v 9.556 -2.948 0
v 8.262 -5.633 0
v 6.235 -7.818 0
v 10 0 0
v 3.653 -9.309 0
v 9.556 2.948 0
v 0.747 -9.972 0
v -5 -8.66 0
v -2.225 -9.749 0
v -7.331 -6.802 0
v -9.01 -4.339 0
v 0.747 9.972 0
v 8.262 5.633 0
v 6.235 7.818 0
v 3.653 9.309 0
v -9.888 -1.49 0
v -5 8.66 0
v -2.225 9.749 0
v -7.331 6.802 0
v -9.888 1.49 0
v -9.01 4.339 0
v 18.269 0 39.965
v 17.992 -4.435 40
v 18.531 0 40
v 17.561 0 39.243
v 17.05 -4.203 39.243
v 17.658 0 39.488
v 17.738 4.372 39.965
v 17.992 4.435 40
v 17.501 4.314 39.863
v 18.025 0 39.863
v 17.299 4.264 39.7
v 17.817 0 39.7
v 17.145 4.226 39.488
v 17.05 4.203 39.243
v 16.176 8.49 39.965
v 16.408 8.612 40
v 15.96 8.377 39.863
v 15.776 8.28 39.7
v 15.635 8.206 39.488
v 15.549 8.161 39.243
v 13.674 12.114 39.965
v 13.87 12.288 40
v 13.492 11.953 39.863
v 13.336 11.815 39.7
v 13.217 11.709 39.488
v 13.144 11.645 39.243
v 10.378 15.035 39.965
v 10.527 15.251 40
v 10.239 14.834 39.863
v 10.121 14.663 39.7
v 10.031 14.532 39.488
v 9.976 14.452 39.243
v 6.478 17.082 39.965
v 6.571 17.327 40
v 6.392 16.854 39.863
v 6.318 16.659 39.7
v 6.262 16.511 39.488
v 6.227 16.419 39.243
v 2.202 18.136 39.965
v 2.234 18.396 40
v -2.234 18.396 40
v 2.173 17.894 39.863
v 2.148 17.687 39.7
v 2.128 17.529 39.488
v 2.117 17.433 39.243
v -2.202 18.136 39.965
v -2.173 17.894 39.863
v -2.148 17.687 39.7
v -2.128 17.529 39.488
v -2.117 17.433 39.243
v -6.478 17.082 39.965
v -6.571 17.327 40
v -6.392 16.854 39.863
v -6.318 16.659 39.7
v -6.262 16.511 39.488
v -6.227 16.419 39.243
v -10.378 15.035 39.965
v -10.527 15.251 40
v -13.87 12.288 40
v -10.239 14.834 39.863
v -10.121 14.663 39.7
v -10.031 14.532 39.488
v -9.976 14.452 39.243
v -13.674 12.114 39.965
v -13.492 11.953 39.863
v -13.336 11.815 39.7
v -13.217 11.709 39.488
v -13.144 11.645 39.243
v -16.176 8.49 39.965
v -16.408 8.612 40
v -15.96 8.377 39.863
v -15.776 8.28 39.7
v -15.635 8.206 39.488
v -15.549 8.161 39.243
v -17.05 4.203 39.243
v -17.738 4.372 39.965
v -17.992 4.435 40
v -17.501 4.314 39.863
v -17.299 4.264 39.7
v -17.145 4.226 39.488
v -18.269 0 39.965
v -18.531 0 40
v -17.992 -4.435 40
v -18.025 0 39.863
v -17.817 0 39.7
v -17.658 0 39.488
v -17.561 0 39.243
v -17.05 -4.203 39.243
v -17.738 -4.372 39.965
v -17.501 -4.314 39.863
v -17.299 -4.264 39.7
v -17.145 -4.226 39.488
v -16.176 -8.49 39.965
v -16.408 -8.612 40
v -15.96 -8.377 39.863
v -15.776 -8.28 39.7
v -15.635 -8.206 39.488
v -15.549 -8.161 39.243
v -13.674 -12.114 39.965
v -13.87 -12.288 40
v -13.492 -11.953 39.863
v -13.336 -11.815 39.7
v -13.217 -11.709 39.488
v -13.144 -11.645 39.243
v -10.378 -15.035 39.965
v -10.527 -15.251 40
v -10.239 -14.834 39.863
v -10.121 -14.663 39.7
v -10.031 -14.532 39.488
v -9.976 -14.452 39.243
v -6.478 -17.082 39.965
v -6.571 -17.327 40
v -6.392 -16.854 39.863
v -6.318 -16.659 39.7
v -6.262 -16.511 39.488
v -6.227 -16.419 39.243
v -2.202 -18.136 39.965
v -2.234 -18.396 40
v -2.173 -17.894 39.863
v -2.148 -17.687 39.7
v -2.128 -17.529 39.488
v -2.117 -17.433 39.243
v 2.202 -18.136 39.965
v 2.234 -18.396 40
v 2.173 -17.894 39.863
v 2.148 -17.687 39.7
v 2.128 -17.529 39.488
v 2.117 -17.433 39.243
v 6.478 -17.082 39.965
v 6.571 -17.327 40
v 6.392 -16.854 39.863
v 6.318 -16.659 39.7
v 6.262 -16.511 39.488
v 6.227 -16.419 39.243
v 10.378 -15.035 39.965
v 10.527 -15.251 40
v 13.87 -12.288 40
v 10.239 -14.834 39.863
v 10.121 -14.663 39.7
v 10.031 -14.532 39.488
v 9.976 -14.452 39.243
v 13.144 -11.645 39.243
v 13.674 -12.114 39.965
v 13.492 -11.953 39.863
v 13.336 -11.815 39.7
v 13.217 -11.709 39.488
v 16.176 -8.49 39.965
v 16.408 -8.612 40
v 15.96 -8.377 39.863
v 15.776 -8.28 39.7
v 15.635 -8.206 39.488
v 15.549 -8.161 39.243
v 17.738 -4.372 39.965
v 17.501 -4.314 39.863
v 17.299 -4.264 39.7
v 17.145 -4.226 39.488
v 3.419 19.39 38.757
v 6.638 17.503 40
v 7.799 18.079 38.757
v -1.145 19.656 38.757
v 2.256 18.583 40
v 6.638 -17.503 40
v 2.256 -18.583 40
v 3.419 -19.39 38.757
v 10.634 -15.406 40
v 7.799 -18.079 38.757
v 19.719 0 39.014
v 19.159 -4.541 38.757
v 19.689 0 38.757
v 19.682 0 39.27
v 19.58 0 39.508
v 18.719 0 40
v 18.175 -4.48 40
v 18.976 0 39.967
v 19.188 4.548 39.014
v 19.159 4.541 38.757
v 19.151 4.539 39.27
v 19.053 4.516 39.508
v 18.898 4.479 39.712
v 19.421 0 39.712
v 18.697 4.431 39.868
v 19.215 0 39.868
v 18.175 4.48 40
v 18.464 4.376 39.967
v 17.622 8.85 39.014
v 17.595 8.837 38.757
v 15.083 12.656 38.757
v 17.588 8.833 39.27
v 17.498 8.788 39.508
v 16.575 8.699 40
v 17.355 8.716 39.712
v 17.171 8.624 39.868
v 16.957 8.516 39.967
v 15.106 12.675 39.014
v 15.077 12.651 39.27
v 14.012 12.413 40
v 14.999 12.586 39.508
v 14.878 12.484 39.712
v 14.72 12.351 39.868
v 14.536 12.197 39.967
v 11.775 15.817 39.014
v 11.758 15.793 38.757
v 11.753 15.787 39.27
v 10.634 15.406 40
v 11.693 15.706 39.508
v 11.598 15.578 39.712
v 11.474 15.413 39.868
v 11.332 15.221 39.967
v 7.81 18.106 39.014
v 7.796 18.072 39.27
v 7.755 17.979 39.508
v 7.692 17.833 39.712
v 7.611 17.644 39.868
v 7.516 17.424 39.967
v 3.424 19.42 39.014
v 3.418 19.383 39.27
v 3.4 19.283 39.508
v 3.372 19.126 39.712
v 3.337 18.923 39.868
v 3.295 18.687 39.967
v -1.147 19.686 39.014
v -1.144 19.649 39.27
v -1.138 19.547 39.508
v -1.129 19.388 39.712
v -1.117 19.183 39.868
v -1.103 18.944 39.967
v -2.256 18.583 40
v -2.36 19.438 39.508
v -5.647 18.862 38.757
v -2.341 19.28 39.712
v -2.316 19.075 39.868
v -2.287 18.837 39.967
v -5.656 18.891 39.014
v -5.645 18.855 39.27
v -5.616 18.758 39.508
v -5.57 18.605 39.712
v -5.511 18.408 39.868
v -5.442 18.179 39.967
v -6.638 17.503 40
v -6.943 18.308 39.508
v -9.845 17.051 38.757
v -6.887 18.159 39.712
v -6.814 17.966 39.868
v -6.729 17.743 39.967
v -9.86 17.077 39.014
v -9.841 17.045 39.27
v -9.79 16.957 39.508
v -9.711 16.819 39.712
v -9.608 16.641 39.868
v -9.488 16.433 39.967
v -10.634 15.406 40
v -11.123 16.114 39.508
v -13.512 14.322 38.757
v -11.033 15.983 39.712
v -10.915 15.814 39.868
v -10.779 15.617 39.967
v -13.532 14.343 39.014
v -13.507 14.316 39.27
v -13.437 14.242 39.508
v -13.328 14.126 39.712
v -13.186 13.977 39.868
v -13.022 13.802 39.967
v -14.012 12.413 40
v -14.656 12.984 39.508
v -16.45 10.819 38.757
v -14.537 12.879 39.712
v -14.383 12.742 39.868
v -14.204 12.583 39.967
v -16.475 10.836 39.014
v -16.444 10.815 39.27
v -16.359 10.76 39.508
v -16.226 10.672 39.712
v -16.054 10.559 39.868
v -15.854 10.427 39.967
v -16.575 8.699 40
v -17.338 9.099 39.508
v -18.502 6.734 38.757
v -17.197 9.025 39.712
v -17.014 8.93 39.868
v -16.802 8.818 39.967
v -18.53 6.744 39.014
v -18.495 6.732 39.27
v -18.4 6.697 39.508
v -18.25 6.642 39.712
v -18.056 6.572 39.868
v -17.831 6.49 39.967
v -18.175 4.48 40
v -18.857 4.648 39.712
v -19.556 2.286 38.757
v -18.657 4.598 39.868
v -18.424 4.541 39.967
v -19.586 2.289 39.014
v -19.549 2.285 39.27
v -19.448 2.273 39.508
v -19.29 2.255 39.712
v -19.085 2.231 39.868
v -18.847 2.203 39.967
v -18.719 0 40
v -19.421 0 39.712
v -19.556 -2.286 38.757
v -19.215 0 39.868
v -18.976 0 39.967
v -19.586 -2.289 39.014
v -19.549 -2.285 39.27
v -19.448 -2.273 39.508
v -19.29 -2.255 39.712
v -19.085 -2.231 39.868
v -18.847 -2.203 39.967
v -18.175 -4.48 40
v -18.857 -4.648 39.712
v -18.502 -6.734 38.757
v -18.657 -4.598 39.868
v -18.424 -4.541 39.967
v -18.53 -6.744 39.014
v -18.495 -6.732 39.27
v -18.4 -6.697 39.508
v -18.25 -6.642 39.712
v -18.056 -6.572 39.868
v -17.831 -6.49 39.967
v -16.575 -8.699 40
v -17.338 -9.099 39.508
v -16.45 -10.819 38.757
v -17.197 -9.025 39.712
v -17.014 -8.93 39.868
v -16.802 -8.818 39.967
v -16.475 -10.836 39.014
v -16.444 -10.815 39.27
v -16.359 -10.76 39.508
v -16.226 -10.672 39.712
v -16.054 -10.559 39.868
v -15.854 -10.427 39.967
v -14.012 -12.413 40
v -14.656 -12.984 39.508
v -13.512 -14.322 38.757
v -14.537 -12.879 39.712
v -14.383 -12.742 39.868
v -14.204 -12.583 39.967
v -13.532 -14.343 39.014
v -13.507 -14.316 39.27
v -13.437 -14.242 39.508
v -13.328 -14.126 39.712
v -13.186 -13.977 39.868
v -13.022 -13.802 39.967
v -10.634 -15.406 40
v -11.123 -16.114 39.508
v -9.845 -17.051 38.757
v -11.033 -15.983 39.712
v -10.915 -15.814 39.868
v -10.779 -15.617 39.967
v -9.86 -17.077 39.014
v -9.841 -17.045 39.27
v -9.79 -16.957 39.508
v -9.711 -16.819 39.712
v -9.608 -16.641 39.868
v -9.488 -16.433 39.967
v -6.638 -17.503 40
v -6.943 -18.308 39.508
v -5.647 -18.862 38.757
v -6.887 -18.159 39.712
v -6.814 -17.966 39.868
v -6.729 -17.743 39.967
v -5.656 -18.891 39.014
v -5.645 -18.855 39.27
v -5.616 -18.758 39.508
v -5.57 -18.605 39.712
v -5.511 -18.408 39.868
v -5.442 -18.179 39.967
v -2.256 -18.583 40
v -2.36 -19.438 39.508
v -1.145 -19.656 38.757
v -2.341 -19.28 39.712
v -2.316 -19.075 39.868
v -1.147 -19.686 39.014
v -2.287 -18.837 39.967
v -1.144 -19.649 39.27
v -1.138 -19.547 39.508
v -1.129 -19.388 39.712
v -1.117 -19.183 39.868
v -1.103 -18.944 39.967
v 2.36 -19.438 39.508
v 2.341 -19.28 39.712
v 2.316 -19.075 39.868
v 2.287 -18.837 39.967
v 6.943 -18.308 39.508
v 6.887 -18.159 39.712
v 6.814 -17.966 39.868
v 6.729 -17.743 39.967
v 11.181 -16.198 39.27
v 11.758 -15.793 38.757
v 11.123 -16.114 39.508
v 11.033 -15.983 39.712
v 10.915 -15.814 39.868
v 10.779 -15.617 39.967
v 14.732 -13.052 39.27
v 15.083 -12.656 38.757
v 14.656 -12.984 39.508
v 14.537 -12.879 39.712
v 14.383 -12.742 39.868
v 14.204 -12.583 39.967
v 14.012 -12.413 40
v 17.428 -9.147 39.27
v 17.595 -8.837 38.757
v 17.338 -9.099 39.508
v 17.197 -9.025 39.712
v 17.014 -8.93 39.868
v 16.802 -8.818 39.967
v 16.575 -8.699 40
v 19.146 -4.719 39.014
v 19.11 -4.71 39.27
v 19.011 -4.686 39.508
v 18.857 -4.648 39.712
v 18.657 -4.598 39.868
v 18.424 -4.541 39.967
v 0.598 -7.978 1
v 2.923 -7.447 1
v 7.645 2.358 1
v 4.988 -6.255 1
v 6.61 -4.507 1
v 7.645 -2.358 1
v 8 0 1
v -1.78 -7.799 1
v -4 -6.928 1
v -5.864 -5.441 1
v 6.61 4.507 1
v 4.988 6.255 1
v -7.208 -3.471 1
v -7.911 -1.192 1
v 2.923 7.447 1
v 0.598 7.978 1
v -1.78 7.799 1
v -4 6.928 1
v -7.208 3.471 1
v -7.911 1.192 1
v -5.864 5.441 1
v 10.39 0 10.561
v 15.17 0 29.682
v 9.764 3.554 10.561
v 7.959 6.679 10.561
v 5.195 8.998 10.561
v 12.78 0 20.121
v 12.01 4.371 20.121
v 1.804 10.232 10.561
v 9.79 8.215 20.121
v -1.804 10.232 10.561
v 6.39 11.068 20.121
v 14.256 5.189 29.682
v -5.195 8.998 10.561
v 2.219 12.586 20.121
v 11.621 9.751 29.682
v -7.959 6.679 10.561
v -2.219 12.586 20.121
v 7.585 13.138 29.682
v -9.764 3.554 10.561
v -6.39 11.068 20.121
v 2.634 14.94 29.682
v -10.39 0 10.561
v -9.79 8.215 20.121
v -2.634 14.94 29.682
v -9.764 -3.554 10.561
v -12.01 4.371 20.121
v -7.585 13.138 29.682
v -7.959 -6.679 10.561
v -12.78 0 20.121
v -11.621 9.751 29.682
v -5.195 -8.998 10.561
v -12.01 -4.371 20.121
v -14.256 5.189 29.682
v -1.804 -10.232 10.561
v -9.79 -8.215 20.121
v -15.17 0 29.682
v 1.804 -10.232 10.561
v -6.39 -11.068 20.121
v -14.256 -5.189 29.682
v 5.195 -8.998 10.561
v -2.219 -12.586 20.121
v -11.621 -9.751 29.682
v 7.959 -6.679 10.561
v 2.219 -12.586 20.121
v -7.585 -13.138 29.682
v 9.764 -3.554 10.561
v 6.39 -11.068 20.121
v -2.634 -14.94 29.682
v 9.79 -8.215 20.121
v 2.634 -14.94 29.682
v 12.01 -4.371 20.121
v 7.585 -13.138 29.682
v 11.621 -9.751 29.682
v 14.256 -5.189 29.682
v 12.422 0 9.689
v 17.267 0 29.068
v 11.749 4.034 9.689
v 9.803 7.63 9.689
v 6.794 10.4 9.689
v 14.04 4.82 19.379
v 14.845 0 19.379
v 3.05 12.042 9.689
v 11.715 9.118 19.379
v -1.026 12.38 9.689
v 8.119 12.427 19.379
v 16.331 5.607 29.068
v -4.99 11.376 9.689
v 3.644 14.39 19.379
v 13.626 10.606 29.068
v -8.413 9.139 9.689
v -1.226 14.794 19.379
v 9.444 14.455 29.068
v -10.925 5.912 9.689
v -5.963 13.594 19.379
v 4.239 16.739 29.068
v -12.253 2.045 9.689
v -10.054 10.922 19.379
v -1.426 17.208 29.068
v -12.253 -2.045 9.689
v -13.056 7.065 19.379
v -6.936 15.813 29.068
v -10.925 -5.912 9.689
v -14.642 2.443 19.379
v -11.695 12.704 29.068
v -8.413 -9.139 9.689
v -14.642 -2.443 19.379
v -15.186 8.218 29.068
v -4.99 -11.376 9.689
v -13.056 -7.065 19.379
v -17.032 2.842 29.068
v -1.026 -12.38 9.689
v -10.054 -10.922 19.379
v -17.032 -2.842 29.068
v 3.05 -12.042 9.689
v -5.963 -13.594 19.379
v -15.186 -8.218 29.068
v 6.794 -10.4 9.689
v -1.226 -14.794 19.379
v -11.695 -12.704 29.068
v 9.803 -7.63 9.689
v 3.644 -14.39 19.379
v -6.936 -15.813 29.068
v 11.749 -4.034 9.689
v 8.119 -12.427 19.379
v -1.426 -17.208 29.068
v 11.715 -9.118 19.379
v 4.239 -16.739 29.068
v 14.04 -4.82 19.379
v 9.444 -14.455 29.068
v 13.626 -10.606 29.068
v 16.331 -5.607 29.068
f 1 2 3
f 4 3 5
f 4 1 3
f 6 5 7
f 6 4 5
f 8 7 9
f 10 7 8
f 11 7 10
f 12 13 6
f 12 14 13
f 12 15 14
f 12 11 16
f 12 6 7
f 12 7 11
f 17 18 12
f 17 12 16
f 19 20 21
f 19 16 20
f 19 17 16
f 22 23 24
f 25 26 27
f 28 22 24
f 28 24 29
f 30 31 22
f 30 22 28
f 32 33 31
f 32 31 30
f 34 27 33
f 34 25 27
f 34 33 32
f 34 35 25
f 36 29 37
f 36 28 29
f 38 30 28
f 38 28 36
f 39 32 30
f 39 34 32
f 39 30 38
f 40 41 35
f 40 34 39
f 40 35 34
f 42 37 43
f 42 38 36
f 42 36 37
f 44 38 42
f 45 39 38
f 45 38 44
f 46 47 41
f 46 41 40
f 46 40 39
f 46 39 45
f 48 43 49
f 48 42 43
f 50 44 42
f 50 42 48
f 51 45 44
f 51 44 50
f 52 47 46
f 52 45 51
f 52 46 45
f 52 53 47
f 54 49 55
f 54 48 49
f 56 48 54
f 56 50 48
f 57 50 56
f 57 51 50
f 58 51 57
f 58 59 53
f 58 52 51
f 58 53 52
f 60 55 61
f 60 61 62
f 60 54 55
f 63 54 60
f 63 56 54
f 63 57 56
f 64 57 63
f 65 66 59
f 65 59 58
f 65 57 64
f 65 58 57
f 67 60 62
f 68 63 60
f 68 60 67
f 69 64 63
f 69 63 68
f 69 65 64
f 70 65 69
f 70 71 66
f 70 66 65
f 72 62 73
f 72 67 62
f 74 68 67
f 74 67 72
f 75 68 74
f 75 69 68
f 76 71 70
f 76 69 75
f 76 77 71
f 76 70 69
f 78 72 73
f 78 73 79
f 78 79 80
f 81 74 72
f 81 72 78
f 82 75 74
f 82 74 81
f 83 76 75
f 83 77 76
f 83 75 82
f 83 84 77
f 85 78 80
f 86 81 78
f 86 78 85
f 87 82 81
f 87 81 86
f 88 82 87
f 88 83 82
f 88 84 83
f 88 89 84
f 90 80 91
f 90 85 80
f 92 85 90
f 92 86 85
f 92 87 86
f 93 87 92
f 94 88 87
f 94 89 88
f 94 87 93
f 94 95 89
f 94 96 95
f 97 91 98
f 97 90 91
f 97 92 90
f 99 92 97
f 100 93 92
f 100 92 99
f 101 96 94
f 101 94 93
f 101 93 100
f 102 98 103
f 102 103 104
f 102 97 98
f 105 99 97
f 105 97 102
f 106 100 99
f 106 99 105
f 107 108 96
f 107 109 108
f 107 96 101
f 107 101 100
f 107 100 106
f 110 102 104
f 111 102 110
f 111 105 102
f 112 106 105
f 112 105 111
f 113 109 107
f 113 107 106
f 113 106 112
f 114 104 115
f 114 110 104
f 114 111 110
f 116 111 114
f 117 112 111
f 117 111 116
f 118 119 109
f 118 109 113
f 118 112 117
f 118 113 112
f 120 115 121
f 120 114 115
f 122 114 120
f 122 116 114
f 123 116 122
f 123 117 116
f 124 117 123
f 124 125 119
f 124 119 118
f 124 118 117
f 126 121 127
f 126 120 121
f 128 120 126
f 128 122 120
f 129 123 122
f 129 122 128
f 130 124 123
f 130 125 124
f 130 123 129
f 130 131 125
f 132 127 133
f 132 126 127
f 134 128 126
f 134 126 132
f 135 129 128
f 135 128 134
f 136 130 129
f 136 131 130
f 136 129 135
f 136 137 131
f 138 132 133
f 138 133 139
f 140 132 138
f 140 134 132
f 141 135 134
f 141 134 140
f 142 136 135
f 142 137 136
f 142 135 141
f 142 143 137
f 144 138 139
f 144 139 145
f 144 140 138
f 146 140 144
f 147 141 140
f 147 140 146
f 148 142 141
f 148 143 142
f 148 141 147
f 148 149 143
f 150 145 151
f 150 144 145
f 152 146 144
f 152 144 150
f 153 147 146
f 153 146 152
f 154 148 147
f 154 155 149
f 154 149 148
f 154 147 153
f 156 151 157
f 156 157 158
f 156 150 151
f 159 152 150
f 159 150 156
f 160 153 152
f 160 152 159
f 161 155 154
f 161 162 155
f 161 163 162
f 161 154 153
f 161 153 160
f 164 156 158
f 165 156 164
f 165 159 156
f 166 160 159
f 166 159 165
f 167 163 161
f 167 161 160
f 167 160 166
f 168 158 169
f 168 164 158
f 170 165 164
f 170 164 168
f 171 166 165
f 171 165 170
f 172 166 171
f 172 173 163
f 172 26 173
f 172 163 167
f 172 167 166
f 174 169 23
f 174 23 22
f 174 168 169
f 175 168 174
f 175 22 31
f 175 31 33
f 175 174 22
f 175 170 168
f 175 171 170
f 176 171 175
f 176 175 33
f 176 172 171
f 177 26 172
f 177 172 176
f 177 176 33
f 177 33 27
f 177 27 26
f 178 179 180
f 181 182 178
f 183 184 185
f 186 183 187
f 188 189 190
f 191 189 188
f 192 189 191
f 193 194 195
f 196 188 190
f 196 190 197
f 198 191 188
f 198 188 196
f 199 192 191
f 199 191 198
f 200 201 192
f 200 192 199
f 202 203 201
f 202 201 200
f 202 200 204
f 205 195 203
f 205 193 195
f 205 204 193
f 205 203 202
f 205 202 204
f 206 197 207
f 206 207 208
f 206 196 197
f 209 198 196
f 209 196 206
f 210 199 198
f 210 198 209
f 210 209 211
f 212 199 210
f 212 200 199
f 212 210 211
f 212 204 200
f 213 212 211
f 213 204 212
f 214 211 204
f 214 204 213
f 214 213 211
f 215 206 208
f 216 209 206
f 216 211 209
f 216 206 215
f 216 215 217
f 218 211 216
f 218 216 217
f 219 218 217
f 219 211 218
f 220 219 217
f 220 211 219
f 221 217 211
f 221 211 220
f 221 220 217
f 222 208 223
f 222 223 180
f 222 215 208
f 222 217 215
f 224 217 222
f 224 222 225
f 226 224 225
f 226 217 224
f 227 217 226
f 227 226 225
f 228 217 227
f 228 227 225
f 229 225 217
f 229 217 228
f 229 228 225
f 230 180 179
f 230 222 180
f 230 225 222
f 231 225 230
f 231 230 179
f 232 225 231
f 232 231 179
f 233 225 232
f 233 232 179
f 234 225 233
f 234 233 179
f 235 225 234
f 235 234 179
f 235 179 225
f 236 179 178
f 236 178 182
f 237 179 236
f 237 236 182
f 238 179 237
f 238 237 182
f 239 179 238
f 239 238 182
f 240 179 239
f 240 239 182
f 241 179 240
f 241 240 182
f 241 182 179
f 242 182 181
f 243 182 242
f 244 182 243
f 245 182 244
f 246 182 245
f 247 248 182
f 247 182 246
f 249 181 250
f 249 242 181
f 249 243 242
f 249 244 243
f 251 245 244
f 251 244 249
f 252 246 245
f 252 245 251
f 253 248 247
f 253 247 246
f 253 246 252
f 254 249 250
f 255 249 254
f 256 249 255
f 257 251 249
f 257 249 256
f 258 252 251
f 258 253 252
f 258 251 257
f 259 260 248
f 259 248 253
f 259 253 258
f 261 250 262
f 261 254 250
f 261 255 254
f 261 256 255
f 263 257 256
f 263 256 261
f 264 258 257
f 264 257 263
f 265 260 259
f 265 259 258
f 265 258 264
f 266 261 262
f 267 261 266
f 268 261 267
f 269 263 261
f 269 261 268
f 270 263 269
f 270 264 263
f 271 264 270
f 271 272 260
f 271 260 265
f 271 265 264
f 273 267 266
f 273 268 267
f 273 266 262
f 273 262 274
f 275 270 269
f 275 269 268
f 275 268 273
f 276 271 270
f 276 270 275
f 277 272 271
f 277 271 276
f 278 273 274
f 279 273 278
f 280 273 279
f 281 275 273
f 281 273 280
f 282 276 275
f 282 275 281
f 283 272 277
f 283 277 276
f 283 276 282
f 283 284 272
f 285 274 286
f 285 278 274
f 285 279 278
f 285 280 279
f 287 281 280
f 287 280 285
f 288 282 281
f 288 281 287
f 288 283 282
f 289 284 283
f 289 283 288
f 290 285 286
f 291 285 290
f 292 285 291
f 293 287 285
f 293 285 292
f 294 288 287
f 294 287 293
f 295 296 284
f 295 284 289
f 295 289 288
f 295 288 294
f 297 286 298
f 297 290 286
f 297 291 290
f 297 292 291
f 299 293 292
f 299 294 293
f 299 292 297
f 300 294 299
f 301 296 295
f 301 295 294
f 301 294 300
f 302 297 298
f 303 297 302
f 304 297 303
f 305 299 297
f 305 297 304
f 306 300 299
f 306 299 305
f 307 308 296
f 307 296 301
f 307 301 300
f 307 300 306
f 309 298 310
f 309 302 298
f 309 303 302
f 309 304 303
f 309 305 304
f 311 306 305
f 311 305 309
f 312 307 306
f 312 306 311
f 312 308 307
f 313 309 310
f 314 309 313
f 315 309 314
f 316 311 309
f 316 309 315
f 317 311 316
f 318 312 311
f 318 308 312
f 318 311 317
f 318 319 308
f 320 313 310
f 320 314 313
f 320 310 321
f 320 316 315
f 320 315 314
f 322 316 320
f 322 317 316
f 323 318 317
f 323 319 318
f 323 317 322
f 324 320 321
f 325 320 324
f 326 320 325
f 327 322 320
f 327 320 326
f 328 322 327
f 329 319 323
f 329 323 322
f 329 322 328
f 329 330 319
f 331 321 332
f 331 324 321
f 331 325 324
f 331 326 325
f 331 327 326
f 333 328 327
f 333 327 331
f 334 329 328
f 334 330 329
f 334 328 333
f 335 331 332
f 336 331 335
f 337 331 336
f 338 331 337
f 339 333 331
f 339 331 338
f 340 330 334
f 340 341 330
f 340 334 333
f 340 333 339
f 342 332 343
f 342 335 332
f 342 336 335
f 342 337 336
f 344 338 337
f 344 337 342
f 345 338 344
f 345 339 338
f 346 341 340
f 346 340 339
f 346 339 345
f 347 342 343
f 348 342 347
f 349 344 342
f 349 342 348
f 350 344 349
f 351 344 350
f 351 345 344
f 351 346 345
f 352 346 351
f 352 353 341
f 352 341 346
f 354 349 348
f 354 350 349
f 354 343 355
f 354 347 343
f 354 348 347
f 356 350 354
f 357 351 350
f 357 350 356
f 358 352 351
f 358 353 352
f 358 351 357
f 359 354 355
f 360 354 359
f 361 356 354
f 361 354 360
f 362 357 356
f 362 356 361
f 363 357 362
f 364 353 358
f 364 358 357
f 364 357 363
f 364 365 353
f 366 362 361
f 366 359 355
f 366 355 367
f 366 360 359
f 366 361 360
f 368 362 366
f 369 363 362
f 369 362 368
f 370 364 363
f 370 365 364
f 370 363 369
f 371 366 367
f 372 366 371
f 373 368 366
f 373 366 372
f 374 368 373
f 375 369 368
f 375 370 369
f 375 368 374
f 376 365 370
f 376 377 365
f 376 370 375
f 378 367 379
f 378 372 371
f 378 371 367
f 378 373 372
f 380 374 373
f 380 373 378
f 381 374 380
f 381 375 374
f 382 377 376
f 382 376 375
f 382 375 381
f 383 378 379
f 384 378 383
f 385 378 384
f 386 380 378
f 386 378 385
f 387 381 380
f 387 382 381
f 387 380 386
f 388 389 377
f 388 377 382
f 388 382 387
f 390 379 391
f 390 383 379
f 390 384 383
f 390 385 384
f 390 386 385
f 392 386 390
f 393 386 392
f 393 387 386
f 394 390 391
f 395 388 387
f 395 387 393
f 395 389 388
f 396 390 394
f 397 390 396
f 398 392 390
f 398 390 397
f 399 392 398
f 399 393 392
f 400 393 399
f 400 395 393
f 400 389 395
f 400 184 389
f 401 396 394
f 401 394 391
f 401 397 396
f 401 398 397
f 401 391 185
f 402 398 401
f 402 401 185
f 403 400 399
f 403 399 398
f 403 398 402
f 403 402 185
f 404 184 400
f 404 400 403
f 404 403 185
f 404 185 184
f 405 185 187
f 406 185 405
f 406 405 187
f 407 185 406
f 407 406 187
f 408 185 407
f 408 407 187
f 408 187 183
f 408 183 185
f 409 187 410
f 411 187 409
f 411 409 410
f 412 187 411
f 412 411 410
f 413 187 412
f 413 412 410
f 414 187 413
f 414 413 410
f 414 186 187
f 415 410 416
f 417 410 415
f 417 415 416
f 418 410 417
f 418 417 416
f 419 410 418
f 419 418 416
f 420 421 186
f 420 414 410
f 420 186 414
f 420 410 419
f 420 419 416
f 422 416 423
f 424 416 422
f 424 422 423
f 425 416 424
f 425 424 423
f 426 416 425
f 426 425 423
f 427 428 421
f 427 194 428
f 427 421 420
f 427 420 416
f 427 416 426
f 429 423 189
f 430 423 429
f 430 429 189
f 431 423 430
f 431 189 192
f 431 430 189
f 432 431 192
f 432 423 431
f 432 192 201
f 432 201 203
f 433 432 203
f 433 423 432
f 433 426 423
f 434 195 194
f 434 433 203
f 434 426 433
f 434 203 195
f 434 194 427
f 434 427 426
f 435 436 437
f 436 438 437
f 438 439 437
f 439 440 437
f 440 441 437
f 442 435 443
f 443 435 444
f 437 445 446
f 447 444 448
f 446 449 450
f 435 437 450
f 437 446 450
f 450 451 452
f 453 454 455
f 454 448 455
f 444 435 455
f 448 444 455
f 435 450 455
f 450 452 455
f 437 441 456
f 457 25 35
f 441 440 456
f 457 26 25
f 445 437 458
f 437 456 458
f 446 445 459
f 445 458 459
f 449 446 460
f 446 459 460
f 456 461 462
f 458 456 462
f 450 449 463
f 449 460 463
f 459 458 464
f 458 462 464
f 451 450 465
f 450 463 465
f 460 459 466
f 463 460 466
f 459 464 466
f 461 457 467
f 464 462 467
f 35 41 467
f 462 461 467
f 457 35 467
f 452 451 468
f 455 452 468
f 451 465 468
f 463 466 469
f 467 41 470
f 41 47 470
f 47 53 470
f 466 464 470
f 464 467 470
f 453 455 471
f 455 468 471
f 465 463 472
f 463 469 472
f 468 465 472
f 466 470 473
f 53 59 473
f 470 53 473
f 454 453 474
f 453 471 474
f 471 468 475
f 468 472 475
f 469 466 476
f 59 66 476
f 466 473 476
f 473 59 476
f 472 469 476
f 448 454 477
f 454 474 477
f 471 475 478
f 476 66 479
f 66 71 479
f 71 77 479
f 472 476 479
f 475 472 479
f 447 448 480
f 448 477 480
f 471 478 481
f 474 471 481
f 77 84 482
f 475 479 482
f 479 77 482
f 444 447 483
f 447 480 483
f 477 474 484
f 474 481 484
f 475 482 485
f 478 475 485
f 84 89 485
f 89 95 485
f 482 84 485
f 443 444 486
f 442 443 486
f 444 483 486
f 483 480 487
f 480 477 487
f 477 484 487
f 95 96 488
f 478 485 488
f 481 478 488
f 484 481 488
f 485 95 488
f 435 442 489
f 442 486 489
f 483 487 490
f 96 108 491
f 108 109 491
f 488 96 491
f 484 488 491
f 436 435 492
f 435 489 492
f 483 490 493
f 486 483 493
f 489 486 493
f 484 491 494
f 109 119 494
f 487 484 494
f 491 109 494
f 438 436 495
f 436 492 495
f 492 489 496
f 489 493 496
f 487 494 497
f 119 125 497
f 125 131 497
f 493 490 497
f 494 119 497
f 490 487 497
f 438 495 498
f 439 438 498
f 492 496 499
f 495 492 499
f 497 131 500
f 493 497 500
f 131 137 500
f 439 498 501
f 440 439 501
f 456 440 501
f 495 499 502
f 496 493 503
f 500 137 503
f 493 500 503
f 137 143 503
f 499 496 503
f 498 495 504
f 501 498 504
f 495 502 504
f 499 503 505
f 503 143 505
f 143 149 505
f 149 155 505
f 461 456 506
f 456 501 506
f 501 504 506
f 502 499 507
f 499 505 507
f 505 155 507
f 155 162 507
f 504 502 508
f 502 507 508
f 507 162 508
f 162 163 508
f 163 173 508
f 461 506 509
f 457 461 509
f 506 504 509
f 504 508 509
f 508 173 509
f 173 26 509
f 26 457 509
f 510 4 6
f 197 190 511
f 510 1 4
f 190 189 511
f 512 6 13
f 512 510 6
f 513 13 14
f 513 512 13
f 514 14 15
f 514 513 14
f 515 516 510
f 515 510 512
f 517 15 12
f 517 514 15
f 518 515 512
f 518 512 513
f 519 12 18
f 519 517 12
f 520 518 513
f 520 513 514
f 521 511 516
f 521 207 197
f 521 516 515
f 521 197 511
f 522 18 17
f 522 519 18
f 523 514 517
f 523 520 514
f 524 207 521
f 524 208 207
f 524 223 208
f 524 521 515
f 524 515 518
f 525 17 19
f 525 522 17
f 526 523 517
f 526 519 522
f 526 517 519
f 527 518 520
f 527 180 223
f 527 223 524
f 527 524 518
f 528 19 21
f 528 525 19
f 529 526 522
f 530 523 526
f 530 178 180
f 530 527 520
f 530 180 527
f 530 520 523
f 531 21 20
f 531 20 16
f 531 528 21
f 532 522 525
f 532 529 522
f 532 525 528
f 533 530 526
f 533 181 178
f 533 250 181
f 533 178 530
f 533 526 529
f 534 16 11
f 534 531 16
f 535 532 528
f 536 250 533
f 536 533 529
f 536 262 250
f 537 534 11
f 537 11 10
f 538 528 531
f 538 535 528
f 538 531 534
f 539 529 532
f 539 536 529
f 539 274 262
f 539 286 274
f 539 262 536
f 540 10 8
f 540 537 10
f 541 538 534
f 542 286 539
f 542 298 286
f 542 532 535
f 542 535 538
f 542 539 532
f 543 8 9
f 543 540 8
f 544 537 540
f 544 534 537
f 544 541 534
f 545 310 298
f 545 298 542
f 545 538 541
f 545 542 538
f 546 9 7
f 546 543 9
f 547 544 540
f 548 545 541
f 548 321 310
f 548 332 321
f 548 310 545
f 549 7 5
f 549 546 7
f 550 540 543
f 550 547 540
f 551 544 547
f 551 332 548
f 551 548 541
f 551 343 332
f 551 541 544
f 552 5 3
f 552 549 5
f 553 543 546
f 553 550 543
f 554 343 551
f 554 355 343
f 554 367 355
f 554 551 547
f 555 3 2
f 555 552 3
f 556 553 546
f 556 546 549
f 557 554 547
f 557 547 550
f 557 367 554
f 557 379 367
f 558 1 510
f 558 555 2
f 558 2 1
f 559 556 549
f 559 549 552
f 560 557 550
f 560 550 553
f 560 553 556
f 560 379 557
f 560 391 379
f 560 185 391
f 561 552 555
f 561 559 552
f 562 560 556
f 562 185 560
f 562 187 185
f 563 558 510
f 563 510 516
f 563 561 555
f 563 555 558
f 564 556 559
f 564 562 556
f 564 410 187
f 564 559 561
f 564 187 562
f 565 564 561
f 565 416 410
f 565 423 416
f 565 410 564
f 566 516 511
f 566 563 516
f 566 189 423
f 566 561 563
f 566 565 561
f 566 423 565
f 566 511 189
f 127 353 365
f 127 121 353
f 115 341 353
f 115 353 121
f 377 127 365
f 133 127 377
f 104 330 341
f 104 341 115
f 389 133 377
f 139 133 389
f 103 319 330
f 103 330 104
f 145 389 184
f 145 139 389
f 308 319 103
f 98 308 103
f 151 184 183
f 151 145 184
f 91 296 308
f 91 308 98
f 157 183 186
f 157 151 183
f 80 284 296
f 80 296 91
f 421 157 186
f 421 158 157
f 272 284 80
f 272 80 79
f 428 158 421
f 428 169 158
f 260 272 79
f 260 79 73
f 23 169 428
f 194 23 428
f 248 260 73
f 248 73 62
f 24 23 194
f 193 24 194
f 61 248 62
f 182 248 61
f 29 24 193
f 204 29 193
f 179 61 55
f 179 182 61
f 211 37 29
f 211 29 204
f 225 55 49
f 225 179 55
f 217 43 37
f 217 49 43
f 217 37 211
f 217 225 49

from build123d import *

# Parameters (mm, degrees)
FILLET_R = 1


with BuildPart() as cono001:
    # Cone001 → Cone001 (revolve)
    with BuildSketch(Plane(origin=(0, 0, 1), x_dir=(1, 0, 0), z_dir=(0, -1, 0))):
        Polygon((0, 0), (8, 0), (18, 40), (0, 40), align=None)
    revolve(axis=Axis((0, 0, 1), (0, 0, 1)))


with BuildPart() as fillet_body:
    # Cone → Cone (revolve)
    with BuildSketch(Plane.XZ):
        Polygon((0, 0), (10, 0), (20, 40), (0, 40), align=None)
    revolve(axis=Axis((0, 0, 0), (0, 0, 1)))

    # Cut: cut Cono001
    add(cono001.part, mode=Mode.SUBTRACT)

    # Fillet
    fillet_edges = [fillet_body.edges().sort_by_distance(p)[0] for p in [
        (-20, 0, 40),
        (-17.75, 0, 40),
    ]]
    fillet(fillet_edges, radius=FILLET_R)


solid = fillet_body.part
